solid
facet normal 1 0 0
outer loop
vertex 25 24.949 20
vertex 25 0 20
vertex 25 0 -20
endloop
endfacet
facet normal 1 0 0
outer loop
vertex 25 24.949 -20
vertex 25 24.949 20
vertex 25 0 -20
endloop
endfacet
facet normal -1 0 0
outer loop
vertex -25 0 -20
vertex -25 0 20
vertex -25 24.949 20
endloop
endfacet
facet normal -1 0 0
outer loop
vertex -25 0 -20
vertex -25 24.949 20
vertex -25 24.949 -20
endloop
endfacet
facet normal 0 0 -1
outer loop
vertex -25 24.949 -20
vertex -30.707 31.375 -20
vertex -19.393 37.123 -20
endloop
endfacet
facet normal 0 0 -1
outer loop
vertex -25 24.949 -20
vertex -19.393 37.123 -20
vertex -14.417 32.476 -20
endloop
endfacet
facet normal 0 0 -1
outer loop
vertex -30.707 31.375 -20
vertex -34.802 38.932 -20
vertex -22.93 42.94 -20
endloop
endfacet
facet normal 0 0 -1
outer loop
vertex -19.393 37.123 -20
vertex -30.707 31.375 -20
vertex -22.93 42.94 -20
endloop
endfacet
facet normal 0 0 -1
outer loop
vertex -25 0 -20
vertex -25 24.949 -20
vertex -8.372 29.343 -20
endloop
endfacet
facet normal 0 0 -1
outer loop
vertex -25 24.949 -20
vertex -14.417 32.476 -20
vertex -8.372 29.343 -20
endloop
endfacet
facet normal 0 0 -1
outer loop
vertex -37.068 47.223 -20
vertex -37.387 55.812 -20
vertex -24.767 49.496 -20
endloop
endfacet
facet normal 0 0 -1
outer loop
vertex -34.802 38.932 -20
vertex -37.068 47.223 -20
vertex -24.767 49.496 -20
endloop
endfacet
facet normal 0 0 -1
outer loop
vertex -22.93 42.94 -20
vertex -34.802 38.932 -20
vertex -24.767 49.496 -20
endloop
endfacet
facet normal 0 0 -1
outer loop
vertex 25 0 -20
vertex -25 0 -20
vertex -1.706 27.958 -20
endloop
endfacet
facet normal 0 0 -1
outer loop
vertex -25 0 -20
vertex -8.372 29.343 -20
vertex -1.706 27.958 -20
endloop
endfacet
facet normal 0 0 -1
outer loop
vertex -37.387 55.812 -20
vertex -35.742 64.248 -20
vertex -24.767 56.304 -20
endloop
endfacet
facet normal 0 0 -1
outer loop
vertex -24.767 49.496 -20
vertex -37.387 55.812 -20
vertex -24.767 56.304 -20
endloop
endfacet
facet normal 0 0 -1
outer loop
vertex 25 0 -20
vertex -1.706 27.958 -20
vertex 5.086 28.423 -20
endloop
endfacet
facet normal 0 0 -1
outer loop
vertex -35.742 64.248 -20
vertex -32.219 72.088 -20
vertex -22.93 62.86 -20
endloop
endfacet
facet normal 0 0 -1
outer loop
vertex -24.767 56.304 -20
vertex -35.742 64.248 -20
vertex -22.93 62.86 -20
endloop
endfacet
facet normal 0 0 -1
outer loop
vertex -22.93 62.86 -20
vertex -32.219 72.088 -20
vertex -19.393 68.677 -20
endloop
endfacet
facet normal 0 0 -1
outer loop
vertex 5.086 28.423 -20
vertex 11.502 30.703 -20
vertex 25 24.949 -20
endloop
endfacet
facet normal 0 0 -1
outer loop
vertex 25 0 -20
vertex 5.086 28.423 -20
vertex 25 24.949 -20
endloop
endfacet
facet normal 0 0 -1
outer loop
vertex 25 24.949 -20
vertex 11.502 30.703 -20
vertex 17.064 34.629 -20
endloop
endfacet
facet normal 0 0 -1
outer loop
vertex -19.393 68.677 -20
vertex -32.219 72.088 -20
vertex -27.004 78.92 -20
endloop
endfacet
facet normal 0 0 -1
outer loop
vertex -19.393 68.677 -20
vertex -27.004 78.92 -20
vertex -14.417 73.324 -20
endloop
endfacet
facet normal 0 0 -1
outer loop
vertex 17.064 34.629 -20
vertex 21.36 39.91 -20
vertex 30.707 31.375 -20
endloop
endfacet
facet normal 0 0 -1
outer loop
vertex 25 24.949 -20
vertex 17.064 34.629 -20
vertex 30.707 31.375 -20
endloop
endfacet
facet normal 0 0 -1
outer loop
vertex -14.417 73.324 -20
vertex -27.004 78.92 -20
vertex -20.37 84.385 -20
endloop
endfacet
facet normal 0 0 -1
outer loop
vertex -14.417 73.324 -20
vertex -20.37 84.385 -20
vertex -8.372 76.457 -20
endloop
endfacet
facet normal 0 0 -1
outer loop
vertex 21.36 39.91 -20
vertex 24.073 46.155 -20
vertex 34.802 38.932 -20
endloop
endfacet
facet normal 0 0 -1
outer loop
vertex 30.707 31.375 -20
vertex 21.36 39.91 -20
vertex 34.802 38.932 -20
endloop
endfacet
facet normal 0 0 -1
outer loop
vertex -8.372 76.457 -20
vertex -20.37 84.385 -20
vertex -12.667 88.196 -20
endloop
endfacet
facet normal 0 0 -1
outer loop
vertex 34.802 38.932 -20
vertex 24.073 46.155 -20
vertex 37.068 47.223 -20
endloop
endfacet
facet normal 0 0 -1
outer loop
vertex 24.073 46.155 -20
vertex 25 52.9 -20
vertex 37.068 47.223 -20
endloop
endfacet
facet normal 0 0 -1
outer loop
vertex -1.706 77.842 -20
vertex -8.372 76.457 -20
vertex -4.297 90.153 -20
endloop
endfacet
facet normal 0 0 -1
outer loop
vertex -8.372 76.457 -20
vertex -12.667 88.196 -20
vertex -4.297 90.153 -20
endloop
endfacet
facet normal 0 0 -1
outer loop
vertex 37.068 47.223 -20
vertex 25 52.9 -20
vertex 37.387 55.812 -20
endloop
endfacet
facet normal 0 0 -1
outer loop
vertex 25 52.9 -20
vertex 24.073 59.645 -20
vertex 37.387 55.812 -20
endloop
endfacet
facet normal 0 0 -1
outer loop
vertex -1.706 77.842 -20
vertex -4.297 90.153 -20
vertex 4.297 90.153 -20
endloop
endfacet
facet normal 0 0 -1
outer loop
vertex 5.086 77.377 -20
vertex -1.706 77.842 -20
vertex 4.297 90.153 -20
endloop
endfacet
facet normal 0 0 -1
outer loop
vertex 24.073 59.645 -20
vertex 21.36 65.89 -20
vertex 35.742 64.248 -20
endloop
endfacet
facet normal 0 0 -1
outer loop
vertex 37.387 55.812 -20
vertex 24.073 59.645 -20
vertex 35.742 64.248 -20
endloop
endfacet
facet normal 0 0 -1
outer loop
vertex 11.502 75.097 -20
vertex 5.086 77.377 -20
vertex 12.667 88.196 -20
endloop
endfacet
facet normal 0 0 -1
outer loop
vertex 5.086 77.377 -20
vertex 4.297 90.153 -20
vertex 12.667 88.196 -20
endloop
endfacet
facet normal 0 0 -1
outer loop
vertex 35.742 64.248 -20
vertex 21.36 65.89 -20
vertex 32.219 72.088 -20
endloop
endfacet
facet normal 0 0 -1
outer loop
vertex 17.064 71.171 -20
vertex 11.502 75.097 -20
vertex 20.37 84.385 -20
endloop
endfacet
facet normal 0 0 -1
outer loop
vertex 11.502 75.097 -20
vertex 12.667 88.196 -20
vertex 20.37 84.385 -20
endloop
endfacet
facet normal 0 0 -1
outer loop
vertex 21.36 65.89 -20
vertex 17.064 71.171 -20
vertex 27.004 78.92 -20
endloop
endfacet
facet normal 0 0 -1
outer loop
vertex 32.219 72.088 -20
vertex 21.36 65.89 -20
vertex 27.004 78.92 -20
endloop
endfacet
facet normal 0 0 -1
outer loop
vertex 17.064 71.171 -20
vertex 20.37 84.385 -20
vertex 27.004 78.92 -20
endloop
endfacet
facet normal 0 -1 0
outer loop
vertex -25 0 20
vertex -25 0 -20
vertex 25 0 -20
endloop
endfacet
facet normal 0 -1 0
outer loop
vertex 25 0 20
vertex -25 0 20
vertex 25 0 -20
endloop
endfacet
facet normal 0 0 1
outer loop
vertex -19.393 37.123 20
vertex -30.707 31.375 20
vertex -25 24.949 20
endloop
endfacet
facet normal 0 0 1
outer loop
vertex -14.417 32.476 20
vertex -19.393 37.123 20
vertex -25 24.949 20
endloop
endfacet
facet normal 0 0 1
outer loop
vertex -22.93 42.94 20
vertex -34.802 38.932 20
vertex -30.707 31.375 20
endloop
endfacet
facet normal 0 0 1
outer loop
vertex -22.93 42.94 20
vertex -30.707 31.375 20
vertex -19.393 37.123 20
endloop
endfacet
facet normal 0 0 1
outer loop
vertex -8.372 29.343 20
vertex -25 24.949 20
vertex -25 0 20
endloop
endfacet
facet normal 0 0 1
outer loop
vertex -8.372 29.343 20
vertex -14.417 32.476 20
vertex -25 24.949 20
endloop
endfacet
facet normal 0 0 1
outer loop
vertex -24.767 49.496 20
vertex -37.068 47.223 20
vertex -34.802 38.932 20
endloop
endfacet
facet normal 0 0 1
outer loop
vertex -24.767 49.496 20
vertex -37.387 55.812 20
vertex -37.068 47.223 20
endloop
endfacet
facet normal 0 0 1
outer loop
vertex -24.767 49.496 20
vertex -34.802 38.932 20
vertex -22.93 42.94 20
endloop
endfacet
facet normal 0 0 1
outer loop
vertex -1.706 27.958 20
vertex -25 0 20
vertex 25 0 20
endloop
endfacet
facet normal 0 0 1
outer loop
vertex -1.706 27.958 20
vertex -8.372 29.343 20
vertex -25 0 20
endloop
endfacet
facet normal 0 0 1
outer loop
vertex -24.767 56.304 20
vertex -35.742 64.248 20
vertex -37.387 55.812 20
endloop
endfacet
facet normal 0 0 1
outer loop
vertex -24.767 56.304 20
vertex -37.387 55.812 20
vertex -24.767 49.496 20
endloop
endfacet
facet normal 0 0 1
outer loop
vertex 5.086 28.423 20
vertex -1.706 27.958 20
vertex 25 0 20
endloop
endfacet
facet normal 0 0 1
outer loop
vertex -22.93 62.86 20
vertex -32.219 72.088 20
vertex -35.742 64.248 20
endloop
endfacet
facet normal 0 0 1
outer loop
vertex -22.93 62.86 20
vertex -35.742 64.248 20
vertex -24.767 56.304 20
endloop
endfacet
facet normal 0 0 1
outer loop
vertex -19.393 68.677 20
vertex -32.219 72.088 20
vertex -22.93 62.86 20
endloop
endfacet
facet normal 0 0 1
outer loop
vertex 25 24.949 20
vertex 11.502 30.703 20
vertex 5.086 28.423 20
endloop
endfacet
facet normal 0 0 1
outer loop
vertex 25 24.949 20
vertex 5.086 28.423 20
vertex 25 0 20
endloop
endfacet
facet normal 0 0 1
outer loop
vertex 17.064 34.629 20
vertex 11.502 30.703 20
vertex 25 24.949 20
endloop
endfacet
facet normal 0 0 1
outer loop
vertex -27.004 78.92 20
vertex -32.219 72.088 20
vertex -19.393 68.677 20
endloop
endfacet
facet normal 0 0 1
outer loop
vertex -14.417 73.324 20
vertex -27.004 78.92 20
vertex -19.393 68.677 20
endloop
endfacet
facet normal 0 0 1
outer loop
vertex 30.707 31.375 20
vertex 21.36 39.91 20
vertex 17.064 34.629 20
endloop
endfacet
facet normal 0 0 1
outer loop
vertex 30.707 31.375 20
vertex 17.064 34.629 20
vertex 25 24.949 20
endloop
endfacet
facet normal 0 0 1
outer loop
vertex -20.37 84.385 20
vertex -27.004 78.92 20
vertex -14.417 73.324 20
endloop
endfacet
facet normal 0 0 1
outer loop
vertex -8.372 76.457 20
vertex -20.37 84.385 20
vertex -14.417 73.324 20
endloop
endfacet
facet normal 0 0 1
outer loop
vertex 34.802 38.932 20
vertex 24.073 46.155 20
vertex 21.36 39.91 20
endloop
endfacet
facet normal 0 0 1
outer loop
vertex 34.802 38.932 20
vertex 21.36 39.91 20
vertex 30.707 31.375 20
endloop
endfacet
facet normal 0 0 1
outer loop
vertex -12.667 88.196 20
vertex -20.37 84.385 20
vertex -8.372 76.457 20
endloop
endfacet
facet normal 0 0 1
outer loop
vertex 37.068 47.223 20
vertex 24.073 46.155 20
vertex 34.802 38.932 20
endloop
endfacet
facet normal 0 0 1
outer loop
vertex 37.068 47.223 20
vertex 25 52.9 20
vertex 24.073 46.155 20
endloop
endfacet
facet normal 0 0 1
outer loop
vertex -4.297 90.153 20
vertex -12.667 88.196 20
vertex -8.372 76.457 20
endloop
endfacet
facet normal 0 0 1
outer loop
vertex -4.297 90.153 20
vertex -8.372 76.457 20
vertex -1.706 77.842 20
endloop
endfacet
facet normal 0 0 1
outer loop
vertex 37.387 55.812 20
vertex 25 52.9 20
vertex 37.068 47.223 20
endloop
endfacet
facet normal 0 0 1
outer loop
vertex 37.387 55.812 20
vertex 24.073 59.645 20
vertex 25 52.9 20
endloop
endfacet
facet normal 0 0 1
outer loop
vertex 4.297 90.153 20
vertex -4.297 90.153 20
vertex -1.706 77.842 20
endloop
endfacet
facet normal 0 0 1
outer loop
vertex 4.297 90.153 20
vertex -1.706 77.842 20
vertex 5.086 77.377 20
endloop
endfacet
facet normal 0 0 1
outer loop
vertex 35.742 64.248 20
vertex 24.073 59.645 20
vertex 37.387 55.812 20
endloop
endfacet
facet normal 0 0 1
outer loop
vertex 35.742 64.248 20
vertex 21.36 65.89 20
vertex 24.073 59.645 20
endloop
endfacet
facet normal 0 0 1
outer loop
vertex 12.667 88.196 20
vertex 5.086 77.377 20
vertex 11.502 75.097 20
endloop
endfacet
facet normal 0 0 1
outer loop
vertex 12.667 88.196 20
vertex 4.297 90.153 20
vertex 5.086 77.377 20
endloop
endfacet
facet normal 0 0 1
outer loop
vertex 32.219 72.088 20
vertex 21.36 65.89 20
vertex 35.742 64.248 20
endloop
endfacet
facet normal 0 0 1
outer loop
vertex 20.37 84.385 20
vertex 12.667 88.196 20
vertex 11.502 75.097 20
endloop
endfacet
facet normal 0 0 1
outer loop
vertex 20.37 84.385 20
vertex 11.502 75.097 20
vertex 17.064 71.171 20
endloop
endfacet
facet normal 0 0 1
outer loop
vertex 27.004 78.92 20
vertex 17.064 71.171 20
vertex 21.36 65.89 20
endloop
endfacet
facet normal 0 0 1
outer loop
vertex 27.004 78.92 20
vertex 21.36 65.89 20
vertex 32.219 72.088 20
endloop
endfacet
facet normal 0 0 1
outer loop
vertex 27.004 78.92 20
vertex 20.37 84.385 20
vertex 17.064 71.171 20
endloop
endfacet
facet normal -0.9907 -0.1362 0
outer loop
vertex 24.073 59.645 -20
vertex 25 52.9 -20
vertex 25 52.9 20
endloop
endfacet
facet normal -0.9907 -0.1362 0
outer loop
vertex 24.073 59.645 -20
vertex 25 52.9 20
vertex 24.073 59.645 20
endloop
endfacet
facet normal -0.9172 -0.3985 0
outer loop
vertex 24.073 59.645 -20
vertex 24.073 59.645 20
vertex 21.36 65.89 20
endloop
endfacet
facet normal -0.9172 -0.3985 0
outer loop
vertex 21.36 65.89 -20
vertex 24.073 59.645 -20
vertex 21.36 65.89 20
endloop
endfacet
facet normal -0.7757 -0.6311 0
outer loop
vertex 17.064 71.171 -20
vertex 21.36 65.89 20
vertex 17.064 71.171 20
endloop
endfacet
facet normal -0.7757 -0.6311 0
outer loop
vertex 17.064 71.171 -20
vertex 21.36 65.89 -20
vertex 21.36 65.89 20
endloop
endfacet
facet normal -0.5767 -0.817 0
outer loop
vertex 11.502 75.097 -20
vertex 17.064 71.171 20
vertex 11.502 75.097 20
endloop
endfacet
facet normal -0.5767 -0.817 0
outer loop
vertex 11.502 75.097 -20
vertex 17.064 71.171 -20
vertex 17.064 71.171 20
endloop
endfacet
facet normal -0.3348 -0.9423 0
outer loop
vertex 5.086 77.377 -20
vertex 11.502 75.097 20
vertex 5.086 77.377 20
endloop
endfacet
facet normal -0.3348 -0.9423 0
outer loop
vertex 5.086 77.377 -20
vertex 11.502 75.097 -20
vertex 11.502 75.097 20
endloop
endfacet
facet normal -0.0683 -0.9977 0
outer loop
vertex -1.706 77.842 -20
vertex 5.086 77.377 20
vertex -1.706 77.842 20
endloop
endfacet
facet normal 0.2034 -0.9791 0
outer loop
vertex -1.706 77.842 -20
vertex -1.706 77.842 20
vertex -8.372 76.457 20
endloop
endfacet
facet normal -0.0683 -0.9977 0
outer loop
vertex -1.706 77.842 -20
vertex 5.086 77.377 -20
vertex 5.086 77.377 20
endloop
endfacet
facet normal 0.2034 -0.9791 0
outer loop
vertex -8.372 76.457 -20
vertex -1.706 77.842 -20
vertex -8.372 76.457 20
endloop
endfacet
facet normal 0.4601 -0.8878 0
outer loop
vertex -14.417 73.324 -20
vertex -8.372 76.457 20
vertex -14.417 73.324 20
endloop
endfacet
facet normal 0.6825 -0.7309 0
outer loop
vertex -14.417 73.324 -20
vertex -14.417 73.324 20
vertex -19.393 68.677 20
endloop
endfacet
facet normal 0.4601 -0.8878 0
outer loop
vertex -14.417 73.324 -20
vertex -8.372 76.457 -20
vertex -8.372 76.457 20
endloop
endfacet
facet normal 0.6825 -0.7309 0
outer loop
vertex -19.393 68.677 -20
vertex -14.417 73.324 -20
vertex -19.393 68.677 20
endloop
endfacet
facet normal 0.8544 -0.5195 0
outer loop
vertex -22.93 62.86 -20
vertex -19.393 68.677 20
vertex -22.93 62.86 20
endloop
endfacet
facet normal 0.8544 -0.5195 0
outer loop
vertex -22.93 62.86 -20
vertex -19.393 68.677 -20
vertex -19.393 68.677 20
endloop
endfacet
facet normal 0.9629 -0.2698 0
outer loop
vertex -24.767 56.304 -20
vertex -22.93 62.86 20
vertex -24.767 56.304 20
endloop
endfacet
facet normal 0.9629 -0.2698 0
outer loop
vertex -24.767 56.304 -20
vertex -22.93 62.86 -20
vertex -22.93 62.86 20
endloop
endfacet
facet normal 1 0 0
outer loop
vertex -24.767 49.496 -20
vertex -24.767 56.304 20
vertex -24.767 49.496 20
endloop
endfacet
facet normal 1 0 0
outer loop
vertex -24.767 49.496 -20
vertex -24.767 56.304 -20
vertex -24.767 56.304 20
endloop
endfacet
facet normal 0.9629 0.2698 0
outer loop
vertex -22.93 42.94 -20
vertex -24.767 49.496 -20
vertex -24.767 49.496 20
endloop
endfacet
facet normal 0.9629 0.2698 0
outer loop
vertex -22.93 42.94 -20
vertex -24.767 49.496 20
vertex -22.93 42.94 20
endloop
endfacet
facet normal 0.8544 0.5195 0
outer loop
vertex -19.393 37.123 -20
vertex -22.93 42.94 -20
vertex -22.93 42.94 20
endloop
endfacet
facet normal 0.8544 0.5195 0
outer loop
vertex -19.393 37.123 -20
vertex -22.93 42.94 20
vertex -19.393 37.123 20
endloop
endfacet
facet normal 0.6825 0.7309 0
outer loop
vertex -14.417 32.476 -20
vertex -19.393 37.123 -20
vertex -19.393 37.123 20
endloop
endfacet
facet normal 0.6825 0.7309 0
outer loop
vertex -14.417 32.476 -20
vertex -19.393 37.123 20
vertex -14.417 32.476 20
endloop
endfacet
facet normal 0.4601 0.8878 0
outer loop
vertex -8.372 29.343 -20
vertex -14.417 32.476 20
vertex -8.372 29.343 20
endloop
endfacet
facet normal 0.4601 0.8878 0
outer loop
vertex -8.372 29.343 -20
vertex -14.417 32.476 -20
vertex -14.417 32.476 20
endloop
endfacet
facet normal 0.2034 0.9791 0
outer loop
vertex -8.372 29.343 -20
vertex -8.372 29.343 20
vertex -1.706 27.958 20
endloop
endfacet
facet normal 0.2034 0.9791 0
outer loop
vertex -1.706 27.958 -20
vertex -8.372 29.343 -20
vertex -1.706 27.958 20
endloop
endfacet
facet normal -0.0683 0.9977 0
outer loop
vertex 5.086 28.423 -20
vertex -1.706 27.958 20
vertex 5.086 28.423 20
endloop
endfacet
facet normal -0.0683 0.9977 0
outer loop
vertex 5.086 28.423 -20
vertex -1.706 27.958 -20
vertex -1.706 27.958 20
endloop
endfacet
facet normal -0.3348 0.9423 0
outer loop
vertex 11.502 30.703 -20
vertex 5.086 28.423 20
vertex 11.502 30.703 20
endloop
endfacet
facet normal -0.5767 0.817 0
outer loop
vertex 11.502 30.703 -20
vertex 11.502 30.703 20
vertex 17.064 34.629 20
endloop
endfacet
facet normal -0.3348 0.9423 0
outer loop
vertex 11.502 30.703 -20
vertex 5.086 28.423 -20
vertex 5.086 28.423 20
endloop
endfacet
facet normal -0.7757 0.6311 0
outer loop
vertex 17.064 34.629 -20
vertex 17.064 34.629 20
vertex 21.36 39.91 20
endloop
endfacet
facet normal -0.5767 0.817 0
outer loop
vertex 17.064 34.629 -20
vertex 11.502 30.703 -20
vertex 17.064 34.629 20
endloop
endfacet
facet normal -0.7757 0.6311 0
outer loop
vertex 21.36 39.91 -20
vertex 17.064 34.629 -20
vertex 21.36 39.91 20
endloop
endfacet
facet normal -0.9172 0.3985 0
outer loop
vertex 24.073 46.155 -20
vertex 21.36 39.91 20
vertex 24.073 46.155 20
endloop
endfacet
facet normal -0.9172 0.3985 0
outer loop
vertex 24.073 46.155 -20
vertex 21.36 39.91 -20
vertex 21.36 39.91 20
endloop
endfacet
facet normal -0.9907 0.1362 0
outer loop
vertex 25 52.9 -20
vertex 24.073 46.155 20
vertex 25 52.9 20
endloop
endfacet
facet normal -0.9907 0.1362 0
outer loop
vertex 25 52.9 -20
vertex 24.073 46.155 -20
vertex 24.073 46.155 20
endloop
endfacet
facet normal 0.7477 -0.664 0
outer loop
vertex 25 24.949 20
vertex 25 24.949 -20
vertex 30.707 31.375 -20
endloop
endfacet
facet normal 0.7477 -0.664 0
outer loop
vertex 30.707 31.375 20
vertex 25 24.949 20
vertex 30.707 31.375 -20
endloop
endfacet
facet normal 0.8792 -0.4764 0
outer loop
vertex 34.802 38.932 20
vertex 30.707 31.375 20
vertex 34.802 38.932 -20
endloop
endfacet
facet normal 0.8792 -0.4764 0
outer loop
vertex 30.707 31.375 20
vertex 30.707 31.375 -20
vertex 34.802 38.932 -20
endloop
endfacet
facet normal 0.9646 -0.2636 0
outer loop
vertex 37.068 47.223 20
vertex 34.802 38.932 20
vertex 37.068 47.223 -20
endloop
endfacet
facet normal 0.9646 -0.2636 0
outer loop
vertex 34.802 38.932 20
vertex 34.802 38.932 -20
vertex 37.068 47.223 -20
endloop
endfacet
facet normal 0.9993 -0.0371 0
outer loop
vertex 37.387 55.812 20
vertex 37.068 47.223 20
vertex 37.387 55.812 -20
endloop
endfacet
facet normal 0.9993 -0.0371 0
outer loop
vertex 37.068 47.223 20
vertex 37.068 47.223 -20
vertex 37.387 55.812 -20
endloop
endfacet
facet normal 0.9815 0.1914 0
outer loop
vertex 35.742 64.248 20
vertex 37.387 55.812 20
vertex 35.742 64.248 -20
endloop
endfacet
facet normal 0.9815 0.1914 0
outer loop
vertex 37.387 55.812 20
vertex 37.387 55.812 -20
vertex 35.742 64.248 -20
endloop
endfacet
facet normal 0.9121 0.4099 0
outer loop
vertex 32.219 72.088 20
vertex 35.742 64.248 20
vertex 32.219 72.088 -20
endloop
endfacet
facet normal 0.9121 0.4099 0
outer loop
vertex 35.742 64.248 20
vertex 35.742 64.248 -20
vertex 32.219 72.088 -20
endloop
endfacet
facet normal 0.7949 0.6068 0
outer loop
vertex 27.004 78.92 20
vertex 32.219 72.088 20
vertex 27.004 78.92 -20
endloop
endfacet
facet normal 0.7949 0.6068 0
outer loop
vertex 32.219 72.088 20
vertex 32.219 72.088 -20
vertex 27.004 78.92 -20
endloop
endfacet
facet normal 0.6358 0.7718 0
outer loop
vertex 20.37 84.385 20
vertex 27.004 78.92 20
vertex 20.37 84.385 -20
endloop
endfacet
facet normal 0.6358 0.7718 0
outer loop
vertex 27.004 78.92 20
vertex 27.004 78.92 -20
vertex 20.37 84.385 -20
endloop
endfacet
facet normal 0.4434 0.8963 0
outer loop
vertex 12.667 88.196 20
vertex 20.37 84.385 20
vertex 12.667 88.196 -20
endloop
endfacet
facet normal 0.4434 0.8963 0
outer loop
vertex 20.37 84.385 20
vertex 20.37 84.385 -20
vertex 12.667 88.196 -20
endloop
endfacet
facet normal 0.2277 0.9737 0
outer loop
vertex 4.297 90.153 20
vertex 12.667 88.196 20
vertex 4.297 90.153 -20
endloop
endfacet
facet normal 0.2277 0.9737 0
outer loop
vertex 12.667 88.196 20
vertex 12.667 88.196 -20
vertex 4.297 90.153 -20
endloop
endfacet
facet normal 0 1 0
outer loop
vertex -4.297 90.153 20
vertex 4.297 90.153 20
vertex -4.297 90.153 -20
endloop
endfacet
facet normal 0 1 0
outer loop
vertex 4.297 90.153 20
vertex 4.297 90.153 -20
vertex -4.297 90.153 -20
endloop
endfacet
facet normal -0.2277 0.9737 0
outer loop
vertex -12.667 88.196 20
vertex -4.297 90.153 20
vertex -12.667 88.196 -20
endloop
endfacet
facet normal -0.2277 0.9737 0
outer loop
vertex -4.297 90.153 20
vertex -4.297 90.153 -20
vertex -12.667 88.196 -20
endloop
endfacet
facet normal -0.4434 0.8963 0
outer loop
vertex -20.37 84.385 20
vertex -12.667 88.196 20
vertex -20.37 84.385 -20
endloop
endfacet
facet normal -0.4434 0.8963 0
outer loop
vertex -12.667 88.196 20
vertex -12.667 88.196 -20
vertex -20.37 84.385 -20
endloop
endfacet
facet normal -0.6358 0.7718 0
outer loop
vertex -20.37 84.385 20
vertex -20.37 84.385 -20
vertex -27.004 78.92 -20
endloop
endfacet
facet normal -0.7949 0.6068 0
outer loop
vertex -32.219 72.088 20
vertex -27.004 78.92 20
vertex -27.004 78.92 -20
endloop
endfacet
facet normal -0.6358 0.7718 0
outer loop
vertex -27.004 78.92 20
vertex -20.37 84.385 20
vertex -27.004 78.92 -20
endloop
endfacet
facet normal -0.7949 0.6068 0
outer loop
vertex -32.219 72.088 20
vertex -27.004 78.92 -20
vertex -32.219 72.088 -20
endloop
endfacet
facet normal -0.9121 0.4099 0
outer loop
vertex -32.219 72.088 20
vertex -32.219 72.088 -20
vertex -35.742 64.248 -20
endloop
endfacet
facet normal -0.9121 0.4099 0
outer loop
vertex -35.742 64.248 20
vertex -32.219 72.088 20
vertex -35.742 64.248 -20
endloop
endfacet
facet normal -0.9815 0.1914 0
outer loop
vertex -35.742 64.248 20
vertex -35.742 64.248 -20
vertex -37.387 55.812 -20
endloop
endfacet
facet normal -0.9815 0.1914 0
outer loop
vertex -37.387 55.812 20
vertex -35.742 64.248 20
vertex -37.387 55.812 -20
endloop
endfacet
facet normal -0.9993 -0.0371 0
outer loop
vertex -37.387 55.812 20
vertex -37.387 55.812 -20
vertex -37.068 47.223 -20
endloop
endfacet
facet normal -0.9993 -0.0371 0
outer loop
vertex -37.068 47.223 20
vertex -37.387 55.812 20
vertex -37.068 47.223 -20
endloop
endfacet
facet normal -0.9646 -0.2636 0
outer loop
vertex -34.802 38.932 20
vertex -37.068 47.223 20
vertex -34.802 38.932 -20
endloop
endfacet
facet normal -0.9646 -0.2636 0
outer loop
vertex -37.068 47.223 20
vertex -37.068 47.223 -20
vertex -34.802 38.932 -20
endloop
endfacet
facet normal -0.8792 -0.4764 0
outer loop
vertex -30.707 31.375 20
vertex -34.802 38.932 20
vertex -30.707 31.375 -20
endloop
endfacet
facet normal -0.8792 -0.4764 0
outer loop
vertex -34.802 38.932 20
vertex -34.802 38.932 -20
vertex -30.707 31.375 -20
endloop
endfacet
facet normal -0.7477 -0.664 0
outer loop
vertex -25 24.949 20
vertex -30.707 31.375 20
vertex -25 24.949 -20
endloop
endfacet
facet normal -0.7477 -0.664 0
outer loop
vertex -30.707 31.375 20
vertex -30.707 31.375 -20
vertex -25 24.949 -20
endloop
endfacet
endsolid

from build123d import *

# Parameters (mm, degrees)
SKETCH1_W                = 50
SKETCH1_H                = 40
BOSS_EXTRUDE1_DEPTH      = 25
BOSS_EXTRUDE2_DEPTH      = 20
BOSS_EXTRUDE2_DEPTH_BACK = 20
SKETCH2_R                = 37.5
CUT_EXTRUDE1_DEPTH       = 20
CUT_EXTRUDE1_DEPTH_BACK  = 20
SKETCH3_R                = 25


with BuildPart() as part:
    # Sketch1 → Boss-Extrude1 (new body)
    with BuildSketch(Plane(origin=(0, 0, 0), x_dir=(1, 0, 0), z_dir=(0, 1, 0))):
        Rectangle(SKETCH1_W, SKETCH1_H)
    extrude(amount=BOSS_EXTRUDE1_DEPTH)

    # Sketch2 → Boss-Extrude2 (add, two sides: drawn at the far end of the back side and taken through both)
    with BuildSketch(Plane.XY.offset(-BOSS_EXTRUDE2_DEPTH_BACK)):
        with Locations((0, 52.9)):
            Circle(SKETCH2_R)
    extrude(amount=BOSS_EXTRUDE2_DEPTH + BOSS_EXTRUDE2_DEPTH_BACK)

    # Sketch3 → Cut-Extrude1 (cut, two sides: drawn at the far end of the back side and taken through both)
    with BuildSketch(Plane.XY.offset(-CUT_EXTRUDE1_DEPTH_BACK)):
        with Locations((0, 52.9)):
            Circle(SKETCH3_R)
    extrude(amount=CUT_EXTRUDE1_DEPTH + CUT_EXTRUDE1_DEPTH_BACK, mode=Mode.SUBTRACT)


solid = part.part
